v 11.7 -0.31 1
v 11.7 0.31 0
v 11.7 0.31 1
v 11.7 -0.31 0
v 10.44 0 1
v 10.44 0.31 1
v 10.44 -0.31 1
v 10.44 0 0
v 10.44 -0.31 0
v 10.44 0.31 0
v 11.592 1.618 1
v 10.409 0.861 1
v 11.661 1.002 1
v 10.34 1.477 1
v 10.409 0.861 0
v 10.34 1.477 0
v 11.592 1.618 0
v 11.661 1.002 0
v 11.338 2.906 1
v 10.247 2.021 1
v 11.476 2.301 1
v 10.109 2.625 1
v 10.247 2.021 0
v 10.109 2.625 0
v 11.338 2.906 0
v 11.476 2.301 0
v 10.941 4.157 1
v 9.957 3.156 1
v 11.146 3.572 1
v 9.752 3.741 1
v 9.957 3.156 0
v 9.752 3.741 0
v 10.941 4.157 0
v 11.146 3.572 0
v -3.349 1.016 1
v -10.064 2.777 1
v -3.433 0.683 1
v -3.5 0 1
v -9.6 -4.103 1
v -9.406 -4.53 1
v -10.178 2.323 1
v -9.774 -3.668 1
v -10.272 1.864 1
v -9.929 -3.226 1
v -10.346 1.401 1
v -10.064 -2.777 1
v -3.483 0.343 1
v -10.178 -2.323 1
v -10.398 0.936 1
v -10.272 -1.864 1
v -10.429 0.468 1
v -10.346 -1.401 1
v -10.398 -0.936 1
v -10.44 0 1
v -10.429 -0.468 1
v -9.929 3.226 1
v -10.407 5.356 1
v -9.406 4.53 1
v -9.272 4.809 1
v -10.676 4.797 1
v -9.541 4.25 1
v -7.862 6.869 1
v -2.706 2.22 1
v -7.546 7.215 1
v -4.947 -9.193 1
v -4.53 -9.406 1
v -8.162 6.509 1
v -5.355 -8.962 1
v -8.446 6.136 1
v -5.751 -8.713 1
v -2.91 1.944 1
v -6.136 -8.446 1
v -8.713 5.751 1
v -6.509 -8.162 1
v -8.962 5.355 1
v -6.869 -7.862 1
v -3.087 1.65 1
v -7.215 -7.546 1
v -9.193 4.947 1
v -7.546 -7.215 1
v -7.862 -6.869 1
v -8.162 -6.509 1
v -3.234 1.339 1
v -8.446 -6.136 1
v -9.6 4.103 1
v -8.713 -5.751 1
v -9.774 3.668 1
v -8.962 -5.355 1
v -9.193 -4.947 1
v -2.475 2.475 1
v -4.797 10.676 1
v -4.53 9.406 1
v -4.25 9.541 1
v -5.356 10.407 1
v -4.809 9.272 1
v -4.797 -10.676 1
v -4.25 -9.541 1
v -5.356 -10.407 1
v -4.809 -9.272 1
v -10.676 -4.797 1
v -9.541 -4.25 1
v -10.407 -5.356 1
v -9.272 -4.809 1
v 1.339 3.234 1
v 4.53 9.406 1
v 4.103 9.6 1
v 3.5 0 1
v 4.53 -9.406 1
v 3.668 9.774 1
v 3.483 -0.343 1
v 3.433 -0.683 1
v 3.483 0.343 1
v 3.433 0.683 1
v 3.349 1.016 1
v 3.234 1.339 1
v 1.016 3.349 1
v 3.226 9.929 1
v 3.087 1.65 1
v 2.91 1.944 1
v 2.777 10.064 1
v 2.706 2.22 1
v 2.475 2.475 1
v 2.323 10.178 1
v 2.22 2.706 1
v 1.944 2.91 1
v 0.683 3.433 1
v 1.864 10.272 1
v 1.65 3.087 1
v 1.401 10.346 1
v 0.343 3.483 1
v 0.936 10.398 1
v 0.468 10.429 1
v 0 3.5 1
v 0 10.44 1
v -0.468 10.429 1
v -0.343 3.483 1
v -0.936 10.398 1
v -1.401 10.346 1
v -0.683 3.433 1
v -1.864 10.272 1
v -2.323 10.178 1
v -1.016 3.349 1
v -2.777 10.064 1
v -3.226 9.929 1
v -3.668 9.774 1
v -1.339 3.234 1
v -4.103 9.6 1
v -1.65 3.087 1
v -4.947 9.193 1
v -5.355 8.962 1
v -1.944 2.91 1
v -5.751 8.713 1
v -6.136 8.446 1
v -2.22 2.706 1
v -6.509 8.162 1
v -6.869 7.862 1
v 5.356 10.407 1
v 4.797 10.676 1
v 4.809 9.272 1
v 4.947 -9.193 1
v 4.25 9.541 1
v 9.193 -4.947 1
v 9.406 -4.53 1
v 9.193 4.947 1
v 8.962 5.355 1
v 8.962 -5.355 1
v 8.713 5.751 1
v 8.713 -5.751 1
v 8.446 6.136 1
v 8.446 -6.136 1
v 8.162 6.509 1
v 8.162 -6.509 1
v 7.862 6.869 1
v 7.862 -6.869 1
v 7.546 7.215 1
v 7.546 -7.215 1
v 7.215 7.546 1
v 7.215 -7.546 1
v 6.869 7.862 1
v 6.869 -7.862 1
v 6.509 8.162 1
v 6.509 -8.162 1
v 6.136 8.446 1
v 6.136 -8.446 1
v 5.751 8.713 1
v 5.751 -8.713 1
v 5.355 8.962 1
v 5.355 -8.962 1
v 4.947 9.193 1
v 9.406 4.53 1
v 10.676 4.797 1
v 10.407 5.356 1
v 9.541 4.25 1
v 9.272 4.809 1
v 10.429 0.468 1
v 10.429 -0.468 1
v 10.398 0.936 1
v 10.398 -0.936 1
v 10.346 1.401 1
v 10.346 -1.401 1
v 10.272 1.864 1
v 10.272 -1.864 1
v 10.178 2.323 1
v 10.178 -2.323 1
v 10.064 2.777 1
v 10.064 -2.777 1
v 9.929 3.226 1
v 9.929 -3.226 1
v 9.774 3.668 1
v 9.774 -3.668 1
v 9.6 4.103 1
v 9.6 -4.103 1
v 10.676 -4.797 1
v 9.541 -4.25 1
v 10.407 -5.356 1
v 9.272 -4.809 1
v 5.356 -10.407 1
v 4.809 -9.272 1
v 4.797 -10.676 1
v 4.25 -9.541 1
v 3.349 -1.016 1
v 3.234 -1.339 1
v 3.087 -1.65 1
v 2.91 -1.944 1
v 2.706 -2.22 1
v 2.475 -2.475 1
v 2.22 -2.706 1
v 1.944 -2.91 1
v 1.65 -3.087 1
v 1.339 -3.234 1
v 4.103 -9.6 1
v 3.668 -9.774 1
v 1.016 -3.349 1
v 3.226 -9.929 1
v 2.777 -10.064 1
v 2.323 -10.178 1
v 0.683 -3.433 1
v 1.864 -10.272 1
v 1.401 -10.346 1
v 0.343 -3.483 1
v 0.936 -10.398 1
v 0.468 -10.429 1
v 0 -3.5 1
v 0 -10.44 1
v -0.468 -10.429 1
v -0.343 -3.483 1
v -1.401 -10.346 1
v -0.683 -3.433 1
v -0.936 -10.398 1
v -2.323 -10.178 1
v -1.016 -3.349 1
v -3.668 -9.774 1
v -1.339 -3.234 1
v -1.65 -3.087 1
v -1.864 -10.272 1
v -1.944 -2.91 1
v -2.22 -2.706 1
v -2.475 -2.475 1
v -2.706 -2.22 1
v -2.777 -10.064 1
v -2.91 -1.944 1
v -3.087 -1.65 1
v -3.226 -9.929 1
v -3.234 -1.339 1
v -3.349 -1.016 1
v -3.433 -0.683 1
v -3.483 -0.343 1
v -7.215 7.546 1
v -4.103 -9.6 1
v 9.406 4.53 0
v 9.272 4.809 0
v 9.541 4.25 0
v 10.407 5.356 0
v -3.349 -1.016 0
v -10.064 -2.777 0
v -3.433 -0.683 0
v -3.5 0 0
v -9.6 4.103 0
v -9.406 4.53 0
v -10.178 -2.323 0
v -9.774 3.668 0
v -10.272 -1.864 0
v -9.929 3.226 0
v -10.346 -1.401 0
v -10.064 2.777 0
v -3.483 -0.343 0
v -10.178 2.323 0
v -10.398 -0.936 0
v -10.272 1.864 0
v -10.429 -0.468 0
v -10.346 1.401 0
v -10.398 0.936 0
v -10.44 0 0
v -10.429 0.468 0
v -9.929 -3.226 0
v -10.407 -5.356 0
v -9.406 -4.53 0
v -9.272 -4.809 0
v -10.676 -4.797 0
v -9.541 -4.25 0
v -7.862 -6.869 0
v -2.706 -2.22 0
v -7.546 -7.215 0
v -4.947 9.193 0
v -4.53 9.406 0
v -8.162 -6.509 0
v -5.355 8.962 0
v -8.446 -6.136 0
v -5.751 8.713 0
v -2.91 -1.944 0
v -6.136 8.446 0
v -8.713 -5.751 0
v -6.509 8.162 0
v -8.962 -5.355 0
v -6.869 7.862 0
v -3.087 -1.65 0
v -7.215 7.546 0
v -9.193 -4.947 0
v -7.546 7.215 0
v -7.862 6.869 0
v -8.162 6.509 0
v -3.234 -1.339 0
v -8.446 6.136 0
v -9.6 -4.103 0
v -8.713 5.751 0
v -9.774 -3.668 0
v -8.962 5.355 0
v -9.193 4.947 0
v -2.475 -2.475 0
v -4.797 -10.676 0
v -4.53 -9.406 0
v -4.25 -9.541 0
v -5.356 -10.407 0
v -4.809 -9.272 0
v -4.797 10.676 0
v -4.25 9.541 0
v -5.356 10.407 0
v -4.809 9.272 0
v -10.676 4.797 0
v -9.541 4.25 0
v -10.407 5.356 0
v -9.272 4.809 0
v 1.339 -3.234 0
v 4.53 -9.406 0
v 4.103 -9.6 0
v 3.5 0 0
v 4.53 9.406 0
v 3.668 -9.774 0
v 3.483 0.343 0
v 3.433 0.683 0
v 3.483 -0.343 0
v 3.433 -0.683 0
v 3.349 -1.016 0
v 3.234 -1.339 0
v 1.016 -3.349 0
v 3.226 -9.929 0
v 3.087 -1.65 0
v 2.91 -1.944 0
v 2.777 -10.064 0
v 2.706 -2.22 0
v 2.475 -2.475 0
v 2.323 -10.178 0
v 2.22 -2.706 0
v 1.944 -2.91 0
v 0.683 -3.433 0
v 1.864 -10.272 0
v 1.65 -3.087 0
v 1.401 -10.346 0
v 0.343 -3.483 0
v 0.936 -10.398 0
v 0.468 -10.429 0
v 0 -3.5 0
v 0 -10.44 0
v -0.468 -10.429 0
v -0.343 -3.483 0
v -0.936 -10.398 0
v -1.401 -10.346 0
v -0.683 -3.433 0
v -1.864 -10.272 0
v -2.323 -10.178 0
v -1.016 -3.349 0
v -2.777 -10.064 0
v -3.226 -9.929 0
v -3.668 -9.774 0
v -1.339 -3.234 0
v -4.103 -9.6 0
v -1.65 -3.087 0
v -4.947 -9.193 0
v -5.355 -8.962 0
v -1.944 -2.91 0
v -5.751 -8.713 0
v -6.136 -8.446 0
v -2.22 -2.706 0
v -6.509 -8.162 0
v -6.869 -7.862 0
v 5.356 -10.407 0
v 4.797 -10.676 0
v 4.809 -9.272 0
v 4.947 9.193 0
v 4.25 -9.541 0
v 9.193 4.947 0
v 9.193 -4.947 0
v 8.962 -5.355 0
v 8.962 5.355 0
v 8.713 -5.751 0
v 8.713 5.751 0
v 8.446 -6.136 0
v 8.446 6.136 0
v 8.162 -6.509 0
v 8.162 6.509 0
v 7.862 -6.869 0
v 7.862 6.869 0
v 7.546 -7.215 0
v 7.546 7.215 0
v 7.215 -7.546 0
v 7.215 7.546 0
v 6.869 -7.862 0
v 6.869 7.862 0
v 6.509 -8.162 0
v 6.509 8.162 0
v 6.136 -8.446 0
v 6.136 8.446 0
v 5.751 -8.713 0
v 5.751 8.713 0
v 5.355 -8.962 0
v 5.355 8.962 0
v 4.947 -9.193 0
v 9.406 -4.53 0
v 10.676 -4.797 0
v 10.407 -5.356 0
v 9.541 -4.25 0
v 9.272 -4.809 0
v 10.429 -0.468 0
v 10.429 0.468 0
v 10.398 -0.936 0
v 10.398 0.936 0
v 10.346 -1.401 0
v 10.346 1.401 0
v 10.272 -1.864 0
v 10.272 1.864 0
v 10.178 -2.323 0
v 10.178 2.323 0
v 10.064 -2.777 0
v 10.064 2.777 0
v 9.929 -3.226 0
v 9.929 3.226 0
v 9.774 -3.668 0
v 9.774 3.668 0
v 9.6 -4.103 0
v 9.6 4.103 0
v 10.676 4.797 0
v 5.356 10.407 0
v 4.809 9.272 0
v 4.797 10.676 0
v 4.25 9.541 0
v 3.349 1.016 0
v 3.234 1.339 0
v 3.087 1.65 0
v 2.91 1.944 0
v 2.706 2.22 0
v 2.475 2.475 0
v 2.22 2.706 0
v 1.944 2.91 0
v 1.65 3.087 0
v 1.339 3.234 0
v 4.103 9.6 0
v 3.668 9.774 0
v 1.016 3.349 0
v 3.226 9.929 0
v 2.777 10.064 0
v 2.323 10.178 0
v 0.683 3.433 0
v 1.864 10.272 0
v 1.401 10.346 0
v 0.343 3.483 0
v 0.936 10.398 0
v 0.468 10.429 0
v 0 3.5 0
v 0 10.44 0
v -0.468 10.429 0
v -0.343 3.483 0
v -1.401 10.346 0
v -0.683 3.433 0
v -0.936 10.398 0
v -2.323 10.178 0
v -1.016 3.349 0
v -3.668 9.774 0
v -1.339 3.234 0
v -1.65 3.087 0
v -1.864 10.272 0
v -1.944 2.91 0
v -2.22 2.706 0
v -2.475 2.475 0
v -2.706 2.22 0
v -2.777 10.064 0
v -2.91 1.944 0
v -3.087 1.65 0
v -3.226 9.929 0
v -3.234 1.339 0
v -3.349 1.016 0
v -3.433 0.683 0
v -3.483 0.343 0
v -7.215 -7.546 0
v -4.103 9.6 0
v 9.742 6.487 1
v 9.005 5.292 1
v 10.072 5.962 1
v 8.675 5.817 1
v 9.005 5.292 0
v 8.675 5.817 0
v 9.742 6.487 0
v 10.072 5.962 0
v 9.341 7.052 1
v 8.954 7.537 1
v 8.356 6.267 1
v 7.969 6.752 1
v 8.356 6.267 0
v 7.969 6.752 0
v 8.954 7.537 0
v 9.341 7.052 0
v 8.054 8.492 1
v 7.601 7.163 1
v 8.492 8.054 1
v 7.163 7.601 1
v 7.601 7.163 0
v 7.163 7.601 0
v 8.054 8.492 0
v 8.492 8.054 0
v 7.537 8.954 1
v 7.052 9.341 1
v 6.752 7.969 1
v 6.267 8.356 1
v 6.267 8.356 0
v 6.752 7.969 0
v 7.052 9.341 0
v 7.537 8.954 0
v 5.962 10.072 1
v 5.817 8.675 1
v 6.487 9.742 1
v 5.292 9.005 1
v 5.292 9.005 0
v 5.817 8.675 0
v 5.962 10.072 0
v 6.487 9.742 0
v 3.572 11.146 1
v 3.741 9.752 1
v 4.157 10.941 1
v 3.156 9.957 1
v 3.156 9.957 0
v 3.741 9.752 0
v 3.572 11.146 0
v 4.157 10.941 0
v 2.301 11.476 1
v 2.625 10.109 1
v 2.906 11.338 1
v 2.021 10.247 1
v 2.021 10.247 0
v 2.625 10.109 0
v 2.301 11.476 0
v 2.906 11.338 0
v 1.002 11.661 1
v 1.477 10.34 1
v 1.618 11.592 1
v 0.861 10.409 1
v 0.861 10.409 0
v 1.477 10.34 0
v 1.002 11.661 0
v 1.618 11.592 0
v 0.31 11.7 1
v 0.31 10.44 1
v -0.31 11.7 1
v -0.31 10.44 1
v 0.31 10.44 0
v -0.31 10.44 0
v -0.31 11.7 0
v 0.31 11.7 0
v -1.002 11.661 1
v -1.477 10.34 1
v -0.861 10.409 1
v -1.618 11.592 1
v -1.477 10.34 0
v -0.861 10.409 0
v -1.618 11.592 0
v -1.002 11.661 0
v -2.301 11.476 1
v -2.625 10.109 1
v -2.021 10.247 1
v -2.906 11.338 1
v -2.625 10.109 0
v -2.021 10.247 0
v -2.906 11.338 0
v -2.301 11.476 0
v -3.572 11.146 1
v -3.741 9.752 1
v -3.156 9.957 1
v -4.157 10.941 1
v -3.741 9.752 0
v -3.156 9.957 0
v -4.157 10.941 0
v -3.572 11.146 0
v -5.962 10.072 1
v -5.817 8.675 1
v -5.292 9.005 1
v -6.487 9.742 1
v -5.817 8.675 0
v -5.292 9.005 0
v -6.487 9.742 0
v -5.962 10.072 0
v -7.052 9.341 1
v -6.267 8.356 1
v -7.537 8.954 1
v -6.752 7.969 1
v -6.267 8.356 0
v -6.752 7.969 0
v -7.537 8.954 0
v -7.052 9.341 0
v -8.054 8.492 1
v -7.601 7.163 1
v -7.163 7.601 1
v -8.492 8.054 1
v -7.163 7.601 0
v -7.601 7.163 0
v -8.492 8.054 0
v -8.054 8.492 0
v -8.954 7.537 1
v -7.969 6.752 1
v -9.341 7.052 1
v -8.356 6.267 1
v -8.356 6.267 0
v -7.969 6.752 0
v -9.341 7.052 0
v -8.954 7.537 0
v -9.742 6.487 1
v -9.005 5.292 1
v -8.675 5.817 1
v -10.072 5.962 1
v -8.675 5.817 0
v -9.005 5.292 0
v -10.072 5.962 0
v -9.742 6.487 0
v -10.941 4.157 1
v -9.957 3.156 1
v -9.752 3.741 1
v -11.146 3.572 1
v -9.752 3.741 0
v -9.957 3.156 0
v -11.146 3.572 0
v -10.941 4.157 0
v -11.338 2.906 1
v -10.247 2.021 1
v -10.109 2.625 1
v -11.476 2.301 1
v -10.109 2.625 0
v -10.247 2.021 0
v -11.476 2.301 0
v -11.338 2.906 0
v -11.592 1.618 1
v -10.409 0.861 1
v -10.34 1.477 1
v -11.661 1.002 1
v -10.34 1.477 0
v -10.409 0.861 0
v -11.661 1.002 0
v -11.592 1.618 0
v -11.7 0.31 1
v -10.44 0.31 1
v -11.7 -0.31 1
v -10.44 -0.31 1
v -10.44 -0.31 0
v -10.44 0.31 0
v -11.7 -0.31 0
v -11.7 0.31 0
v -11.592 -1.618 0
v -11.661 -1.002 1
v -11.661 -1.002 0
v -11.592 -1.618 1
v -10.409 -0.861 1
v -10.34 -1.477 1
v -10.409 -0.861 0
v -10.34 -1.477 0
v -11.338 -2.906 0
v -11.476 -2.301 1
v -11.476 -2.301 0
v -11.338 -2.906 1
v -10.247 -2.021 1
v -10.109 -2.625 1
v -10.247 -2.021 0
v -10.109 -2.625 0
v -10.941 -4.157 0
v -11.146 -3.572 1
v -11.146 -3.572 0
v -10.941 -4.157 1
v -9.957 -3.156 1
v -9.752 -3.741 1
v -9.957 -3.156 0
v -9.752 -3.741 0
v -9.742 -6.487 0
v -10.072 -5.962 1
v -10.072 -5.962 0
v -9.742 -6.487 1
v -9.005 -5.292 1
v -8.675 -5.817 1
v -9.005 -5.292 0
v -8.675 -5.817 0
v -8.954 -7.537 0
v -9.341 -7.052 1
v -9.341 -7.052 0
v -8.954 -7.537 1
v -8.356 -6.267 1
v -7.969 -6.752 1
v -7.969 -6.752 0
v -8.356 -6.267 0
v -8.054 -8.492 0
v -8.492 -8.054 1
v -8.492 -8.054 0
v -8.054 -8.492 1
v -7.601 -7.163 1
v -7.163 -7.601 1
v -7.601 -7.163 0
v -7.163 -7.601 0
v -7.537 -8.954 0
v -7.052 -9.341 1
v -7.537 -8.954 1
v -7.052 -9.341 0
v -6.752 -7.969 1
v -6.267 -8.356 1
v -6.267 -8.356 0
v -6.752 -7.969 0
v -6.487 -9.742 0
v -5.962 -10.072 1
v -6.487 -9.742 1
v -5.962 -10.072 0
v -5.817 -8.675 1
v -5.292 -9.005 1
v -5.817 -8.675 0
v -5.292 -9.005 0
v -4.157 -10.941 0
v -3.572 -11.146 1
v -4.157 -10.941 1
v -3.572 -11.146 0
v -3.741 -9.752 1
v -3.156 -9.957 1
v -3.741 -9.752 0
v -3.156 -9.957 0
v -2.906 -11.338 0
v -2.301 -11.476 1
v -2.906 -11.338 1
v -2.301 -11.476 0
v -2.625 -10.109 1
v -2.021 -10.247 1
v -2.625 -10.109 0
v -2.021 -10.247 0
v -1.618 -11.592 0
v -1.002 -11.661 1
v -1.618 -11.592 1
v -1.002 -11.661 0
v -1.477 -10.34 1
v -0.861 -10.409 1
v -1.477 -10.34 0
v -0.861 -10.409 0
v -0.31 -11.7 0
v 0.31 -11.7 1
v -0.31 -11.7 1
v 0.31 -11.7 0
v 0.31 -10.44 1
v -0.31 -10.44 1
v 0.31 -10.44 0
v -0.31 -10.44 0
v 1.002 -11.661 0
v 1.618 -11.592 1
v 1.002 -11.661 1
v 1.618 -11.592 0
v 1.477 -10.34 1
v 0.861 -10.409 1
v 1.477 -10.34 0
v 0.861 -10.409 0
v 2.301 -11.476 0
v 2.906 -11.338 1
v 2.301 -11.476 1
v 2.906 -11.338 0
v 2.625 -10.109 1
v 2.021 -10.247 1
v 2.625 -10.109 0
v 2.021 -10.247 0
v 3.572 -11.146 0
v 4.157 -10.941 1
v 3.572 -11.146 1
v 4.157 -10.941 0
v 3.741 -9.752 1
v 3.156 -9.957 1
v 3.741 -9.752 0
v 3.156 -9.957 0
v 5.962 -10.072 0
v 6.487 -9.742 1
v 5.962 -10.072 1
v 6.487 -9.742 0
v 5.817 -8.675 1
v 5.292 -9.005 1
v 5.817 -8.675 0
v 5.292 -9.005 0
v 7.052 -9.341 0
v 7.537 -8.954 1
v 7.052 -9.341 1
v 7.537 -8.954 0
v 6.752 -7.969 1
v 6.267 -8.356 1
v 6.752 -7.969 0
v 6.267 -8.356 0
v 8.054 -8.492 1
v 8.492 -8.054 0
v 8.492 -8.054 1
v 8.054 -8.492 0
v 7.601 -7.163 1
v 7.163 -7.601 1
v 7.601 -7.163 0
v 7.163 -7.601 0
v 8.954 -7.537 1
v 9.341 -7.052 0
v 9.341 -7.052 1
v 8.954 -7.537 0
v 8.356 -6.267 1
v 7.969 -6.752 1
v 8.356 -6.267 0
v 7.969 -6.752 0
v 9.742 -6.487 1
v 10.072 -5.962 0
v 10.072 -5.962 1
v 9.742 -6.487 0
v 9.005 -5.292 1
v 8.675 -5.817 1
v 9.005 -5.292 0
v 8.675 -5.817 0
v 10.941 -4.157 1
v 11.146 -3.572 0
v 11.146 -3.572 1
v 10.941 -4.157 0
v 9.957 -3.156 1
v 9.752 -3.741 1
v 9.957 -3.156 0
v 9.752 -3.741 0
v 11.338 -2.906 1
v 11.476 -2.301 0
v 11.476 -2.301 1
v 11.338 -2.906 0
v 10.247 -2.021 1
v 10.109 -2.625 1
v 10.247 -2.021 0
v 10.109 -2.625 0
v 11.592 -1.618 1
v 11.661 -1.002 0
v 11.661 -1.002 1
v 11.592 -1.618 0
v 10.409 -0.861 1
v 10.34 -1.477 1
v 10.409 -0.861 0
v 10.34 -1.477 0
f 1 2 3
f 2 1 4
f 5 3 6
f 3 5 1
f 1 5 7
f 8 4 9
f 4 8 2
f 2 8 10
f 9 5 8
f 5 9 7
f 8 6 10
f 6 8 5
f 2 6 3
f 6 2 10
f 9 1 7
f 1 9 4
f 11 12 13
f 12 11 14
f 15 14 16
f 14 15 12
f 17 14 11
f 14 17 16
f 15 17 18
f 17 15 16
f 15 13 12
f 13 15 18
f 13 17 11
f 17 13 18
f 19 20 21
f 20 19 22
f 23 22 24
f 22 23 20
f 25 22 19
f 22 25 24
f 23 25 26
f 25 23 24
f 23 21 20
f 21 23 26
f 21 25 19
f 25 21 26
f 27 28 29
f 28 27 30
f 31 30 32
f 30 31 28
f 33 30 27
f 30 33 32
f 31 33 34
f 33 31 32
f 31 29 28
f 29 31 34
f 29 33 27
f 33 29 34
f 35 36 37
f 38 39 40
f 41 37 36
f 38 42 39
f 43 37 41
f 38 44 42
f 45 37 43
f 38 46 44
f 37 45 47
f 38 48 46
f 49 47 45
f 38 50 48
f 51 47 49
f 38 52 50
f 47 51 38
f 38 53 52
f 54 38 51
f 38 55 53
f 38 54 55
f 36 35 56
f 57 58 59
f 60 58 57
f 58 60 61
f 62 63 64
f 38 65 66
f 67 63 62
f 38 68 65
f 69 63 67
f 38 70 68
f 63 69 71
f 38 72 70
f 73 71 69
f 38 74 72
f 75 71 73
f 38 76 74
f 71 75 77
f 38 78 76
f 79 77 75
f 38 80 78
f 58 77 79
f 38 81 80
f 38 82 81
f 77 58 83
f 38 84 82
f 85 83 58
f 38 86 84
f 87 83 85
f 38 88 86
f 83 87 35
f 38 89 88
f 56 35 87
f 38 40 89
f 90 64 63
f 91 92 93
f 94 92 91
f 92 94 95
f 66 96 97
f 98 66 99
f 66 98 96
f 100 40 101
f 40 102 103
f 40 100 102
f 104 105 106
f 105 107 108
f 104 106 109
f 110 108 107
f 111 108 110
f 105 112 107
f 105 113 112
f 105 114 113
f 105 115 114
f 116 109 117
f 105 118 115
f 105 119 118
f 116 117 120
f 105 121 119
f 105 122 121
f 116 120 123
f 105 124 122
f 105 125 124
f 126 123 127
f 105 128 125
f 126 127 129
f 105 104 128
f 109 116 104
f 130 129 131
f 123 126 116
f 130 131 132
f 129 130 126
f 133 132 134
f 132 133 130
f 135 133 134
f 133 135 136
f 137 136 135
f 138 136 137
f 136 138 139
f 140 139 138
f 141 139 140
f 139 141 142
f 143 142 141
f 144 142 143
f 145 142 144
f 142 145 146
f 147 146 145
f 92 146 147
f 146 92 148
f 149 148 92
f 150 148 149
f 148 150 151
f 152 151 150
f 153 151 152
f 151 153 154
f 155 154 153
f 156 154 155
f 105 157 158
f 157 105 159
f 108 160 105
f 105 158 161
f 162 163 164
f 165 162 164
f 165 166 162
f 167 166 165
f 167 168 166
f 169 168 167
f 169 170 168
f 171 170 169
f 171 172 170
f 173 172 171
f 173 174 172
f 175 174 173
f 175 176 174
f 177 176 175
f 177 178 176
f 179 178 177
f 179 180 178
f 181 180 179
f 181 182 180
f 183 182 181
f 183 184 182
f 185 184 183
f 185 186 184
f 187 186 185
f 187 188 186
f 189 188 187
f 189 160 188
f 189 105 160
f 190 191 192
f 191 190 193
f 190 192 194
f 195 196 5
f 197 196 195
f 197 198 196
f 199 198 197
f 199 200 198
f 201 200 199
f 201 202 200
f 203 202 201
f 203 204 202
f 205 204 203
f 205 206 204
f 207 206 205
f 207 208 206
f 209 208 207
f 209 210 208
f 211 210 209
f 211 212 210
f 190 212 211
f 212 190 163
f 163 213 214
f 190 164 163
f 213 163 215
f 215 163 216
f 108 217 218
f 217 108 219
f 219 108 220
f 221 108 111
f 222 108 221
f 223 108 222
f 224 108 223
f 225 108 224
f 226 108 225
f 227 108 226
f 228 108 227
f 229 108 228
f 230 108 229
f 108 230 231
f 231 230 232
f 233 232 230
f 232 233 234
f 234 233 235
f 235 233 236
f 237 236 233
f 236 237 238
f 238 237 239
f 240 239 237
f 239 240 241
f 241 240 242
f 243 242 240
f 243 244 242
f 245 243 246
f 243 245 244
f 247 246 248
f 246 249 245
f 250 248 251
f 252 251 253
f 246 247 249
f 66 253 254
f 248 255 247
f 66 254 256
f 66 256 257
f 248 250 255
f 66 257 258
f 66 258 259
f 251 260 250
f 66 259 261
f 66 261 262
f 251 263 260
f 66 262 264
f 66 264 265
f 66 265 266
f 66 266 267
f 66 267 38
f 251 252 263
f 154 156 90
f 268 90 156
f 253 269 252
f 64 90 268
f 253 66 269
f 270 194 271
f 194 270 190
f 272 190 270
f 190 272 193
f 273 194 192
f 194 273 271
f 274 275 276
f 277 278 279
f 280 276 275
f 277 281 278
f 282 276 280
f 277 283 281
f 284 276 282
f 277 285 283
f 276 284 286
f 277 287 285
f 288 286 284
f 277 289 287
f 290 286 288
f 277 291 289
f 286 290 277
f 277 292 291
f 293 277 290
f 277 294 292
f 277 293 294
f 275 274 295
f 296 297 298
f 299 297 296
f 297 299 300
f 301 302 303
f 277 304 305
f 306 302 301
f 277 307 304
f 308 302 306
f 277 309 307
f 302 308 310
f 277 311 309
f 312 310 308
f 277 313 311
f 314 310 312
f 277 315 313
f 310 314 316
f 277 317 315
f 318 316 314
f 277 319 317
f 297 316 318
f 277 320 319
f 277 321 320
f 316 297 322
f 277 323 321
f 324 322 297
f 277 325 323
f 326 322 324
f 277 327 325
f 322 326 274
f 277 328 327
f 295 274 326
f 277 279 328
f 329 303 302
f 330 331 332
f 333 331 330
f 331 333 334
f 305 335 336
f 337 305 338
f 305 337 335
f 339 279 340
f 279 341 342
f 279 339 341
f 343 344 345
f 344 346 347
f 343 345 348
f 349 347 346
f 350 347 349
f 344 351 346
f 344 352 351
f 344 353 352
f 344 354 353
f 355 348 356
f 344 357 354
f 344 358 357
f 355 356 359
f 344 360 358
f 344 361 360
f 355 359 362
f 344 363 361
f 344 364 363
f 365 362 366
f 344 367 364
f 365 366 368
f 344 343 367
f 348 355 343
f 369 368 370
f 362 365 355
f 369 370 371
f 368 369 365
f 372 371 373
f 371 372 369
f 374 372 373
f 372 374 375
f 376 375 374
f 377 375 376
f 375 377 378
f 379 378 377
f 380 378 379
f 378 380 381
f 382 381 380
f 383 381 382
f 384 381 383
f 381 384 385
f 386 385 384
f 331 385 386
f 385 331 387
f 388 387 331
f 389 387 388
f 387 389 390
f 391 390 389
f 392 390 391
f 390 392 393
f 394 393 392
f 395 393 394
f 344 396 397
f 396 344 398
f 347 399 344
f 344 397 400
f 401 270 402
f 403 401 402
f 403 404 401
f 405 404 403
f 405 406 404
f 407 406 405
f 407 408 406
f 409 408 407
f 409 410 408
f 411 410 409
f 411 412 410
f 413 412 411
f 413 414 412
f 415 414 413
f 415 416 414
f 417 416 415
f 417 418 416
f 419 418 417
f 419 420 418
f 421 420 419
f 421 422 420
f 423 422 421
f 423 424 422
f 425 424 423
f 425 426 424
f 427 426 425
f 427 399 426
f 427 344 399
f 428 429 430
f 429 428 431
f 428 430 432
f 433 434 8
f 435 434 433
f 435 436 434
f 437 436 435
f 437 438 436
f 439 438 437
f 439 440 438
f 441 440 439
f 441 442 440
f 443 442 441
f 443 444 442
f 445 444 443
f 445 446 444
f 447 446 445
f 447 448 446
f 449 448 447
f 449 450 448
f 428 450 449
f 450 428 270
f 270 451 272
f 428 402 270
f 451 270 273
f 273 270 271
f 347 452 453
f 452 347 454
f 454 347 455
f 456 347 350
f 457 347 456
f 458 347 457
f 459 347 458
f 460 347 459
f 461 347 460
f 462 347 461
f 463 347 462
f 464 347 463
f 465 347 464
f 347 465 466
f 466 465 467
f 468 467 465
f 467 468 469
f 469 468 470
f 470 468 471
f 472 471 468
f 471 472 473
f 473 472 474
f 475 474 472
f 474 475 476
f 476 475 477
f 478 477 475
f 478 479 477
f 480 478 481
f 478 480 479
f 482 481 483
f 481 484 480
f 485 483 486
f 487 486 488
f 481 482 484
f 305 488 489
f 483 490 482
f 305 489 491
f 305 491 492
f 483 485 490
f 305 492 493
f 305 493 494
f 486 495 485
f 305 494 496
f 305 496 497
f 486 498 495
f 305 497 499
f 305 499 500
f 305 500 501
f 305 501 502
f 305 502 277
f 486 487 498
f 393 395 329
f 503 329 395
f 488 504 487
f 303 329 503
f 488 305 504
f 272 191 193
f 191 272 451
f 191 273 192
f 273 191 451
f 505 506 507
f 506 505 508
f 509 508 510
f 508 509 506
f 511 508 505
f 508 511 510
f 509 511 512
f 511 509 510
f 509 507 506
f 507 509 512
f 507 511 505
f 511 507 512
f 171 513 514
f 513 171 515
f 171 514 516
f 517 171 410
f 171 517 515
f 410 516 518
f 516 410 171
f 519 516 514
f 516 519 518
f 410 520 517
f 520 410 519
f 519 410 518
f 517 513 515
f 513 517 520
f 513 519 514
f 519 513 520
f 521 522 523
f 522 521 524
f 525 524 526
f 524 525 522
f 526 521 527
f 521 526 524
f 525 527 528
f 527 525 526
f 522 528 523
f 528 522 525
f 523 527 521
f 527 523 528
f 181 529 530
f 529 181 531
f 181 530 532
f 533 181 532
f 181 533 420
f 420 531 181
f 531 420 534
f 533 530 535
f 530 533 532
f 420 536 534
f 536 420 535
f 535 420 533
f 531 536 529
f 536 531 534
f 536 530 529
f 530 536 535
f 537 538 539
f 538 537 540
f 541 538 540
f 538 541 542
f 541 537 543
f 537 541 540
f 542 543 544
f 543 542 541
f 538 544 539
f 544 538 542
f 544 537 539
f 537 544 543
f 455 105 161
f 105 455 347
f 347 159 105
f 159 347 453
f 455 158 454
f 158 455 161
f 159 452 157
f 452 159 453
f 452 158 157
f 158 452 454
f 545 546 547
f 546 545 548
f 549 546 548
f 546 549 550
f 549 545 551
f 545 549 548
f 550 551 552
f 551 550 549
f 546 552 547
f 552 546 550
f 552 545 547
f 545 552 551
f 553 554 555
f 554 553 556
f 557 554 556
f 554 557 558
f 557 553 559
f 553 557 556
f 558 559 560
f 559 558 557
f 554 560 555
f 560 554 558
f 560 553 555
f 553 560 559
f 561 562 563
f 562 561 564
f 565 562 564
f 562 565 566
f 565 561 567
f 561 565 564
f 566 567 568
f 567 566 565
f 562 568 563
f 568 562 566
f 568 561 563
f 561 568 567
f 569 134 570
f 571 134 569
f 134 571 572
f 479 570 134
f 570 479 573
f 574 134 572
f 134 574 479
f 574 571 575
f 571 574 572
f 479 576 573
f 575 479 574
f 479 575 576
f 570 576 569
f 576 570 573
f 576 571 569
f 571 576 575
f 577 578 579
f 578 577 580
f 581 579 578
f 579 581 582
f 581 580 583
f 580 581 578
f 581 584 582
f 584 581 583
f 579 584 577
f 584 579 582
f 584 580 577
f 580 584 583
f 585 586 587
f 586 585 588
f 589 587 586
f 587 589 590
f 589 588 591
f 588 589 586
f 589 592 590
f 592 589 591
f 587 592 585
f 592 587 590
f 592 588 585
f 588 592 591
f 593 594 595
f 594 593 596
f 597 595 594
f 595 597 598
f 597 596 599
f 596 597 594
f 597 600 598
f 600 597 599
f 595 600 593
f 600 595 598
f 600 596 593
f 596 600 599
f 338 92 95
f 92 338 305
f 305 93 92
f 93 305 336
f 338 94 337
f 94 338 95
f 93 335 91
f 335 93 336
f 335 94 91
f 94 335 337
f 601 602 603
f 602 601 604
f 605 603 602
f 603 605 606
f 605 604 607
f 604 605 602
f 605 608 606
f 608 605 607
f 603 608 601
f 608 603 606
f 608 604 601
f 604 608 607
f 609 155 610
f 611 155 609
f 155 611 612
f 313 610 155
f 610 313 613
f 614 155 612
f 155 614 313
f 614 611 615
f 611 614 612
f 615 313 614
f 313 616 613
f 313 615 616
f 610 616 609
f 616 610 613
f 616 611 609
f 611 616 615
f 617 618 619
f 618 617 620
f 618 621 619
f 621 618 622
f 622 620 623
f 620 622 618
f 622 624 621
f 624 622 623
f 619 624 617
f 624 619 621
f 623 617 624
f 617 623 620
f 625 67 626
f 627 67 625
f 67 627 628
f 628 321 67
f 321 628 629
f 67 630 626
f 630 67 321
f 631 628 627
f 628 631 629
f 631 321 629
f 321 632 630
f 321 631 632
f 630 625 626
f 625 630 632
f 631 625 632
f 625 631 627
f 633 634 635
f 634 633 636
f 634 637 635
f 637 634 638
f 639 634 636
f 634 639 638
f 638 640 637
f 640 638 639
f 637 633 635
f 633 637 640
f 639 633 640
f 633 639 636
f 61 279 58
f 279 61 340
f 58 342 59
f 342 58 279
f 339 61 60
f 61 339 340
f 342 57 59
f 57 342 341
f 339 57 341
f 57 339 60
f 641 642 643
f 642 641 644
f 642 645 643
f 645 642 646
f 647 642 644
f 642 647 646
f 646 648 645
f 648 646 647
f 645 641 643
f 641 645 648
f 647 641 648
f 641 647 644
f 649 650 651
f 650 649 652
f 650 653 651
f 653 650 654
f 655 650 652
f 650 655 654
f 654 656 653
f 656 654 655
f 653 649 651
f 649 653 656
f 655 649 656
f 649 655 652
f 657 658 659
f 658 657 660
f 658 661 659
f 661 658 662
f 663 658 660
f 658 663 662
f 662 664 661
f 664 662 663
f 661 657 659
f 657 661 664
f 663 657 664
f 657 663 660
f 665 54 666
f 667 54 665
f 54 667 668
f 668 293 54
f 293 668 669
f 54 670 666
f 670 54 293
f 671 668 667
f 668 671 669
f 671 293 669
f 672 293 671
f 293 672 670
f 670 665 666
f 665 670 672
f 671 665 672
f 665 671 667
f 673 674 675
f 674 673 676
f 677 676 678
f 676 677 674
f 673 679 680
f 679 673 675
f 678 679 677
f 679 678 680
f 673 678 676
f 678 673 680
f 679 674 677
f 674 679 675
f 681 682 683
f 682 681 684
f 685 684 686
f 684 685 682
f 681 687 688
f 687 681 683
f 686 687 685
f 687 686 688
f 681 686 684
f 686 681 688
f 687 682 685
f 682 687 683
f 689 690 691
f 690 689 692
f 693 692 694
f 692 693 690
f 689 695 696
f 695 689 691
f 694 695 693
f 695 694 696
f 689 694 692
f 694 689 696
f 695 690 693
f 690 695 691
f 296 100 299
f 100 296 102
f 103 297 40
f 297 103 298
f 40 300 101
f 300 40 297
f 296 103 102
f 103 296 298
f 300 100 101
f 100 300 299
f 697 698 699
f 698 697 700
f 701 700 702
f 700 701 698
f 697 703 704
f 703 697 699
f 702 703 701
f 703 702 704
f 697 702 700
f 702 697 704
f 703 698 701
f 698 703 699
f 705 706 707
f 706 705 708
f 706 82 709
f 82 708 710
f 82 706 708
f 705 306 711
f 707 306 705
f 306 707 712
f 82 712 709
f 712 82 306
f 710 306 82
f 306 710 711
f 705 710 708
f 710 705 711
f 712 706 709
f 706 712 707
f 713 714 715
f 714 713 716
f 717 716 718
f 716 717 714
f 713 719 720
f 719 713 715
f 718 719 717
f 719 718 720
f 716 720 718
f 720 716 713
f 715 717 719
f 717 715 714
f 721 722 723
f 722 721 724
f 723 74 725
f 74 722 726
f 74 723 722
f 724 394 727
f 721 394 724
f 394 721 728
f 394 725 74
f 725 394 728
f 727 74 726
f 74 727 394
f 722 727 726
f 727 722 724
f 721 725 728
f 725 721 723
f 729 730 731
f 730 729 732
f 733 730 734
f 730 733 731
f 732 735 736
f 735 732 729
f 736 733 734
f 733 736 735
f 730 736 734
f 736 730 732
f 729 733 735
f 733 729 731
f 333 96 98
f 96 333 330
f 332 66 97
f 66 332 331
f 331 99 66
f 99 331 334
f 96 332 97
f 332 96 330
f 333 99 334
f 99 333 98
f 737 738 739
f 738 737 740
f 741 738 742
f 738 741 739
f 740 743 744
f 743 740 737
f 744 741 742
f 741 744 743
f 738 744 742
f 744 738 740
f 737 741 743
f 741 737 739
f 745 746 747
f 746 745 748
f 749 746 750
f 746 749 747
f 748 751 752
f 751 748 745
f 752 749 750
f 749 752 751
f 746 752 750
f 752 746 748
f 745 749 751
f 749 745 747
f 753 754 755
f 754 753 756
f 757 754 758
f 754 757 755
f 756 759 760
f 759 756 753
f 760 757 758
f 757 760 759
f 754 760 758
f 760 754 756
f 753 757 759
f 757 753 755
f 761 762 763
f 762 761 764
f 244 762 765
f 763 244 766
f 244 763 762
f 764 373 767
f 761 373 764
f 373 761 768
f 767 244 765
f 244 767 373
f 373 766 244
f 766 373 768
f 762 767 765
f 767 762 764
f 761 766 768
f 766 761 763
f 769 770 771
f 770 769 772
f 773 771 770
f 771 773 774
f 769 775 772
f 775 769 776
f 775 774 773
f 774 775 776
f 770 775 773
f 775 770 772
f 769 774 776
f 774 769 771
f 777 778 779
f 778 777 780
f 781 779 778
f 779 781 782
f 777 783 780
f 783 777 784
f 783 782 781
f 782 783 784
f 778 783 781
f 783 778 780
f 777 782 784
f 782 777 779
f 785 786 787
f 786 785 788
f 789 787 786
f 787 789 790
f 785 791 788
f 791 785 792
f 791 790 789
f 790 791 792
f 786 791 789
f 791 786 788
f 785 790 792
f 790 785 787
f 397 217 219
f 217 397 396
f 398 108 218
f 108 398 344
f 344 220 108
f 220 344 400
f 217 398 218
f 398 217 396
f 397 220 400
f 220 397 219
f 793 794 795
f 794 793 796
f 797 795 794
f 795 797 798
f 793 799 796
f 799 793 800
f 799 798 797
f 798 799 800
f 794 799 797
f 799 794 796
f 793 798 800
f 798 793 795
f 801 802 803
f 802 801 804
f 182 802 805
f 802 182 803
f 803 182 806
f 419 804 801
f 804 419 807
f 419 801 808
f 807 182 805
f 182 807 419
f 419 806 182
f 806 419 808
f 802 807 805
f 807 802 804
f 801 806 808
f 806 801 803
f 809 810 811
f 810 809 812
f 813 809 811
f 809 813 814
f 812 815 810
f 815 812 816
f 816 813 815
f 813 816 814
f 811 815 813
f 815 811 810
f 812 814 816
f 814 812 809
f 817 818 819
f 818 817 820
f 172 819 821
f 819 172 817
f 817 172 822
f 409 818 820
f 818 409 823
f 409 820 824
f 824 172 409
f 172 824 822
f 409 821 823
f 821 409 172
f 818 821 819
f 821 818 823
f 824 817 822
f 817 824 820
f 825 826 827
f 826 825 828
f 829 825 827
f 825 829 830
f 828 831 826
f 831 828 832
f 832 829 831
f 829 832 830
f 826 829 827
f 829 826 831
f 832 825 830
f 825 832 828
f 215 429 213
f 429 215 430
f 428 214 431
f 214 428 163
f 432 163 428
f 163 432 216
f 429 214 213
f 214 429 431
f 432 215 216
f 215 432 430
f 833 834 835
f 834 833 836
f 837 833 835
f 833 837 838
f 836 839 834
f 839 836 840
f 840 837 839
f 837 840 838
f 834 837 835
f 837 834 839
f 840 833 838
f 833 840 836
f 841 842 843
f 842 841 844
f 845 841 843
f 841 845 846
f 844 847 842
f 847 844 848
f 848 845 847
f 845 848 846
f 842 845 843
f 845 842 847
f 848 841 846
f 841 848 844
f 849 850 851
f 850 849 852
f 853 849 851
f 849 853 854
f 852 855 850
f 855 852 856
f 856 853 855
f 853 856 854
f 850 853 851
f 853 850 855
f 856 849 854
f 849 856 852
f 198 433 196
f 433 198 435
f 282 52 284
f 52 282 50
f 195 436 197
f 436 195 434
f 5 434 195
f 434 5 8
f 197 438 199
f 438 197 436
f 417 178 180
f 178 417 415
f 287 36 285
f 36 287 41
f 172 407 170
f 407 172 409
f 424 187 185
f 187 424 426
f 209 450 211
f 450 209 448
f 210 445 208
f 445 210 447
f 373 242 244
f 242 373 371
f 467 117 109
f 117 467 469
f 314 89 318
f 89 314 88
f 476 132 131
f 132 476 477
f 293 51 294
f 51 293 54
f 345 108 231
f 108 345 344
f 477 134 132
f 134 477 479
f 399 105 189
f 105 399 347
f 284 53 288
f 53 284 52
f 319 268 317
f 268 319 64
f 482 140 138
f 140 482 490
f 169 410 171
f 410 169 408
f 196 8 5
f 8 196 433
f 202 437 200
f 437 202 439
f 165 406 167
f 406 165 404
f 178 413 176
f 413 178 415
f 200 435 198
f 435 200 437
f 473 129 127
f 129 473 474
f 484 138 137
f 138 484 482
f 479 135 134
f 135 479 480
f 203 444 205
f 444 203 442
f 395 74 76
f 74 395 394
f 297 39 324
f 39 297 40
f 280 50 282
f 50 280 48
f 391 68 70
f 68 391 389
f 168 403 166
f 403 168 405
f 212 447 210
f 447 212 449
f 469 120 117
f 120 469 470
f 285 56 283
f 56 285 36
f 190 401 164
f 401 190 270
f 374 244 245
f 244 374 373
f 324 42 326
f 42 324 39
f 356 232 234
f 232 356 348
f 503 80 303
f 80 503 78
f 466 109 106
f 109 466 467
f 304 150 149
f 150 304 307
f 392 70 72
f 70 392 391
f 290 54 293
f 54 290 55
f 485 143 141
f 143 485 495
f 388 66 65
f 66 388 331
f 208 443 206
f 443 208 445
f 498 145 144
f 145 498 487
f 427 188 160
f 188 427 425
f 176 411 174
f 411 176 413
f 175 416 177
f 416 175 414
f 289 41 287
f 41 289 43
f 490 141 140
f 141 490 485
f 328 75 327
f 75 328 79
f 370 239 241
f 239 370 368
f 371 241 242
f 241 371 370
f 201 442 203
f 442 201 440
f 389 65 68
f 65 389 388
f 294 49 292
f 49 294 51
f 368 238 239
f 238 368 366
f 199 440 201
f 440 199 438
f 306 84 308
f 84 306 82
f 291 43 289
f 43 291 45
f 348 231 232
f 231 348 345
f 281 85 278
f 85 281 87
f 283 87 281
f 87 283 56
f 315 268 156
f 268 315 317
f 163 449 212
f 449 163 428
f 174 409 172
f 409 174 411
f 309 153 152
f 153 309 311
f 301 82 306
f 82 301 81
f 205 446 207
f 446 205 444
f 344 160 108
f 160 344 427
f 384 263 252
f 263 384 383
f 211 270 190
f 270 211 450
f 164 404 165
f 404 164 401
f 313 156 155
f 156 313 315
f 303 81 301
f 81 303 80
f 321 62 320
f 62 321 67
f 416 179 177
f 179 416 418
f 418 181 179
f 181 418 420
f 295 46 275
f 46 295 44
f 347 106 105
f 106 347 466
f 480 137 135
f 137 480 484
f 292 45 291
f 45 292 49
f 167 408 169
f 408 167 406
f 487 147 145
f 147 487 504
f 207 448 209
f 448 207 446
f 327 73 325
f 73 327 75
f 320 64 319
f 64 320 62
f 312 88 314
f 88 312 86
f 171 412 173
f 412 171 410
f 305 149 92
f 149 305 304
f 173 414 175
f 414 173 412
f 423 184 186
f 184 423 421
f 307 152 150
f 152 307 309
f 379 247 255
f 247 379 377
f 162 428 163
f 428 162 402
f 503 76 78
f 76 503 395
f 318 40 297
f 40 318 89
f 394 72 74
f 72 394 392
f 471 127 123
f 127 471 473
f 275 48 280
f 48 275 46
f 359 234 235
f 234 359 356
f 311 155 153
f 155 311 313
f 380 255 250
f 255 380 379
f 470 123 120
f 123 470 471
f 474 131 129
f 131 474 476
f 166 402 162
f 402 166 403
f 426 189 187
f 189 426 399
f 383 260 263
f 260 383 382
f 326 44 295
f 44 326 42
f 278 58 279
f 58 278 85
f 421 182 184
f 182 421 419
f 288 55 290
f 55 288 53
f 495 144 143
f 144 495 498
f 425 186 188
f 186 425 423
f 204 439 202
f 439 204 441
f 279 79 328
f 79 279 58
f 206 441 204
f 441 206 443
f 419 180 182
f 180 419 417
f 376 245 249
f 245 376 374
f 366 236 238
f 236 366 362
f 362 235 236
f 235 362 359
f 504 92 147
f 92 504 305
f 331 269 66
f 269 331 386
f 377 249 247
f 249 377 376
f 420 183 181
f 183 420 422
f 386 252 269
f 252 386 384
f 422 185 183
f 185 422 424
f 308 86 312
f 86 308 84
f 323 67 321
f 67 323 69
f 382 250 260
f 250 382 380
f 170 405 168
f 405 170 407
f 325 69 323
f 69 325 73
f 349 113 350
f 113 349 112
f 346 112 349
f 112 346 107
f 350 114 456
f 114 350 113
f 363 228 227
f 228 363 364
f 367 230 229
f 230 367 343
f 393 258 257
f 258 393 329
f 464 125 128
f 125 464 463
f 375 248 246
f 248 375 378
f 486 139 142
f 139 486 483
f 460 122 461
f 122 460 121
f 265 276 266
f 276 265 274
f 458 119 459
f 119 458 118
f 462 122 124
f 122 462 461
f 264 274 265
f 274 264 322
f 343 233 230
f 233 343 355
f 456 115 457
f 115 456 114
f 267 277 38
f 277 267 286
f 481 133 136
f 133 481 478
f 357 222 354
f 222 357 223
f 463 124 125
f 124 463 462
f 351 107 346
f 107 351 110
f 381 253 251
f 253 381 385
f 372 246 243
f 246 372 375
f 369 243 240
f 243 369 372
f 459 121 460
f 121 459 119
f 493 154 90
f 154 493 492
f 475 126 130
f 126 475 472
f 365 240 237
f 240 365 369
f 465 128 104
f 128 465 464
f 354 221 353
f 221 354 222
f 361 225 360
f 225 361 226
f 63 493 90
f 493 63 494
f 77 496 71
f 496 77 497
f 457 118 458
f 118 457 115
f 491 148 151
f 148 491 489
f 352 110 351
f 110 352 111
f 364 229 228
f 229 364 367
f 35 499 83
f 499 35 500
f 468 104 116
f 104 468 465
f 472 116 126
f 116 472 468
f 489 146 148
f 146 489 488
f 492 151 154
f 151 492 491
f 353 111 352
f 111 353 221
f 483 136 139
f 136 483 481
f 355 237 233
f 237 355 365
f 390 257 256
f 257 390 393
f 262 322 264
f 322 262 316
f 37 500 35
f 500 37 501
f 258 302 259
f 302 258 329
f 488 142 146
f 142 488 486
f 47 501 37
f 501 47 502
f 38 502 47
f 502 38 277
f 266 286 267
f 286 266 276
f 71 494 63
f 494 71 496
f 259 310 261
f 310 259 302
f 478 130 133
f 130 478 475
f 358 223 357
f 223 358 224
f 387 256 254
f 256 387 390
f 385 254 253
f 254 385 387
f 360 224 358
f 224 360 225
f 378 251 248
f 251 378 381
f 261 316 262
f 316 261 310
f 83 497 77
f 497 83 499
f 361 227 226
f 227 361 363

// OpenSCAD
// part_id: jup2
// name: Jupiter driven gear
// source_drawing_ids: DRW-012
// units: mm
// revision: 0.1
// SPDX-License-Identifier: MIT

module jup2_tooth_ring(root_d = 20.88, tip_d = 23.40, tooth_count = 56, thickness = 1.0, tooth_w = 0.62) {
    union() {
        cylinder(d = root_d, h = thickness, center = false, $fn = 140);
        for (a = [0 : 360 / tooth_count : 360 - 360 / tooth_count]) {
            rotate([0, 0, a])
                translate([root_d / 2, -tooth_w / 2, 0])
                    cube([(tip_d - root_d) / 2, tooth_w, thickness], center = false);
        }
    }
}

module part_jup2(
    root_d = 20.88,
    tip_d = 23.40,
    tooth_count = 56,
    thickness = 1.0,
    bore_d = 7.0,
    pin_d = 1.0,
    pin_r = 2.9,
    pin_a = -62
) {
    difference() {
        jup2_tooth_ring(root_d = root_d, tip_d = tip_d, tooth_count = tooth_count, thickness = thickness);
        translate([0, 0, -0.05]) cylinder(d = bore_d, h = thickness + 0.1, $fn = 64);
        translate([pin_r * cos(pin_a), pin_r * sin(pin_a), -0.05])
            cylinder(d = pin_d, h = thickness + 0.1, $fn = 24);
    }
}

// ---- "main guard" ----
// Default to previewing when opened directly:
if (is_undef(__LIB_MODE__)) {
    part_jup2();
}
